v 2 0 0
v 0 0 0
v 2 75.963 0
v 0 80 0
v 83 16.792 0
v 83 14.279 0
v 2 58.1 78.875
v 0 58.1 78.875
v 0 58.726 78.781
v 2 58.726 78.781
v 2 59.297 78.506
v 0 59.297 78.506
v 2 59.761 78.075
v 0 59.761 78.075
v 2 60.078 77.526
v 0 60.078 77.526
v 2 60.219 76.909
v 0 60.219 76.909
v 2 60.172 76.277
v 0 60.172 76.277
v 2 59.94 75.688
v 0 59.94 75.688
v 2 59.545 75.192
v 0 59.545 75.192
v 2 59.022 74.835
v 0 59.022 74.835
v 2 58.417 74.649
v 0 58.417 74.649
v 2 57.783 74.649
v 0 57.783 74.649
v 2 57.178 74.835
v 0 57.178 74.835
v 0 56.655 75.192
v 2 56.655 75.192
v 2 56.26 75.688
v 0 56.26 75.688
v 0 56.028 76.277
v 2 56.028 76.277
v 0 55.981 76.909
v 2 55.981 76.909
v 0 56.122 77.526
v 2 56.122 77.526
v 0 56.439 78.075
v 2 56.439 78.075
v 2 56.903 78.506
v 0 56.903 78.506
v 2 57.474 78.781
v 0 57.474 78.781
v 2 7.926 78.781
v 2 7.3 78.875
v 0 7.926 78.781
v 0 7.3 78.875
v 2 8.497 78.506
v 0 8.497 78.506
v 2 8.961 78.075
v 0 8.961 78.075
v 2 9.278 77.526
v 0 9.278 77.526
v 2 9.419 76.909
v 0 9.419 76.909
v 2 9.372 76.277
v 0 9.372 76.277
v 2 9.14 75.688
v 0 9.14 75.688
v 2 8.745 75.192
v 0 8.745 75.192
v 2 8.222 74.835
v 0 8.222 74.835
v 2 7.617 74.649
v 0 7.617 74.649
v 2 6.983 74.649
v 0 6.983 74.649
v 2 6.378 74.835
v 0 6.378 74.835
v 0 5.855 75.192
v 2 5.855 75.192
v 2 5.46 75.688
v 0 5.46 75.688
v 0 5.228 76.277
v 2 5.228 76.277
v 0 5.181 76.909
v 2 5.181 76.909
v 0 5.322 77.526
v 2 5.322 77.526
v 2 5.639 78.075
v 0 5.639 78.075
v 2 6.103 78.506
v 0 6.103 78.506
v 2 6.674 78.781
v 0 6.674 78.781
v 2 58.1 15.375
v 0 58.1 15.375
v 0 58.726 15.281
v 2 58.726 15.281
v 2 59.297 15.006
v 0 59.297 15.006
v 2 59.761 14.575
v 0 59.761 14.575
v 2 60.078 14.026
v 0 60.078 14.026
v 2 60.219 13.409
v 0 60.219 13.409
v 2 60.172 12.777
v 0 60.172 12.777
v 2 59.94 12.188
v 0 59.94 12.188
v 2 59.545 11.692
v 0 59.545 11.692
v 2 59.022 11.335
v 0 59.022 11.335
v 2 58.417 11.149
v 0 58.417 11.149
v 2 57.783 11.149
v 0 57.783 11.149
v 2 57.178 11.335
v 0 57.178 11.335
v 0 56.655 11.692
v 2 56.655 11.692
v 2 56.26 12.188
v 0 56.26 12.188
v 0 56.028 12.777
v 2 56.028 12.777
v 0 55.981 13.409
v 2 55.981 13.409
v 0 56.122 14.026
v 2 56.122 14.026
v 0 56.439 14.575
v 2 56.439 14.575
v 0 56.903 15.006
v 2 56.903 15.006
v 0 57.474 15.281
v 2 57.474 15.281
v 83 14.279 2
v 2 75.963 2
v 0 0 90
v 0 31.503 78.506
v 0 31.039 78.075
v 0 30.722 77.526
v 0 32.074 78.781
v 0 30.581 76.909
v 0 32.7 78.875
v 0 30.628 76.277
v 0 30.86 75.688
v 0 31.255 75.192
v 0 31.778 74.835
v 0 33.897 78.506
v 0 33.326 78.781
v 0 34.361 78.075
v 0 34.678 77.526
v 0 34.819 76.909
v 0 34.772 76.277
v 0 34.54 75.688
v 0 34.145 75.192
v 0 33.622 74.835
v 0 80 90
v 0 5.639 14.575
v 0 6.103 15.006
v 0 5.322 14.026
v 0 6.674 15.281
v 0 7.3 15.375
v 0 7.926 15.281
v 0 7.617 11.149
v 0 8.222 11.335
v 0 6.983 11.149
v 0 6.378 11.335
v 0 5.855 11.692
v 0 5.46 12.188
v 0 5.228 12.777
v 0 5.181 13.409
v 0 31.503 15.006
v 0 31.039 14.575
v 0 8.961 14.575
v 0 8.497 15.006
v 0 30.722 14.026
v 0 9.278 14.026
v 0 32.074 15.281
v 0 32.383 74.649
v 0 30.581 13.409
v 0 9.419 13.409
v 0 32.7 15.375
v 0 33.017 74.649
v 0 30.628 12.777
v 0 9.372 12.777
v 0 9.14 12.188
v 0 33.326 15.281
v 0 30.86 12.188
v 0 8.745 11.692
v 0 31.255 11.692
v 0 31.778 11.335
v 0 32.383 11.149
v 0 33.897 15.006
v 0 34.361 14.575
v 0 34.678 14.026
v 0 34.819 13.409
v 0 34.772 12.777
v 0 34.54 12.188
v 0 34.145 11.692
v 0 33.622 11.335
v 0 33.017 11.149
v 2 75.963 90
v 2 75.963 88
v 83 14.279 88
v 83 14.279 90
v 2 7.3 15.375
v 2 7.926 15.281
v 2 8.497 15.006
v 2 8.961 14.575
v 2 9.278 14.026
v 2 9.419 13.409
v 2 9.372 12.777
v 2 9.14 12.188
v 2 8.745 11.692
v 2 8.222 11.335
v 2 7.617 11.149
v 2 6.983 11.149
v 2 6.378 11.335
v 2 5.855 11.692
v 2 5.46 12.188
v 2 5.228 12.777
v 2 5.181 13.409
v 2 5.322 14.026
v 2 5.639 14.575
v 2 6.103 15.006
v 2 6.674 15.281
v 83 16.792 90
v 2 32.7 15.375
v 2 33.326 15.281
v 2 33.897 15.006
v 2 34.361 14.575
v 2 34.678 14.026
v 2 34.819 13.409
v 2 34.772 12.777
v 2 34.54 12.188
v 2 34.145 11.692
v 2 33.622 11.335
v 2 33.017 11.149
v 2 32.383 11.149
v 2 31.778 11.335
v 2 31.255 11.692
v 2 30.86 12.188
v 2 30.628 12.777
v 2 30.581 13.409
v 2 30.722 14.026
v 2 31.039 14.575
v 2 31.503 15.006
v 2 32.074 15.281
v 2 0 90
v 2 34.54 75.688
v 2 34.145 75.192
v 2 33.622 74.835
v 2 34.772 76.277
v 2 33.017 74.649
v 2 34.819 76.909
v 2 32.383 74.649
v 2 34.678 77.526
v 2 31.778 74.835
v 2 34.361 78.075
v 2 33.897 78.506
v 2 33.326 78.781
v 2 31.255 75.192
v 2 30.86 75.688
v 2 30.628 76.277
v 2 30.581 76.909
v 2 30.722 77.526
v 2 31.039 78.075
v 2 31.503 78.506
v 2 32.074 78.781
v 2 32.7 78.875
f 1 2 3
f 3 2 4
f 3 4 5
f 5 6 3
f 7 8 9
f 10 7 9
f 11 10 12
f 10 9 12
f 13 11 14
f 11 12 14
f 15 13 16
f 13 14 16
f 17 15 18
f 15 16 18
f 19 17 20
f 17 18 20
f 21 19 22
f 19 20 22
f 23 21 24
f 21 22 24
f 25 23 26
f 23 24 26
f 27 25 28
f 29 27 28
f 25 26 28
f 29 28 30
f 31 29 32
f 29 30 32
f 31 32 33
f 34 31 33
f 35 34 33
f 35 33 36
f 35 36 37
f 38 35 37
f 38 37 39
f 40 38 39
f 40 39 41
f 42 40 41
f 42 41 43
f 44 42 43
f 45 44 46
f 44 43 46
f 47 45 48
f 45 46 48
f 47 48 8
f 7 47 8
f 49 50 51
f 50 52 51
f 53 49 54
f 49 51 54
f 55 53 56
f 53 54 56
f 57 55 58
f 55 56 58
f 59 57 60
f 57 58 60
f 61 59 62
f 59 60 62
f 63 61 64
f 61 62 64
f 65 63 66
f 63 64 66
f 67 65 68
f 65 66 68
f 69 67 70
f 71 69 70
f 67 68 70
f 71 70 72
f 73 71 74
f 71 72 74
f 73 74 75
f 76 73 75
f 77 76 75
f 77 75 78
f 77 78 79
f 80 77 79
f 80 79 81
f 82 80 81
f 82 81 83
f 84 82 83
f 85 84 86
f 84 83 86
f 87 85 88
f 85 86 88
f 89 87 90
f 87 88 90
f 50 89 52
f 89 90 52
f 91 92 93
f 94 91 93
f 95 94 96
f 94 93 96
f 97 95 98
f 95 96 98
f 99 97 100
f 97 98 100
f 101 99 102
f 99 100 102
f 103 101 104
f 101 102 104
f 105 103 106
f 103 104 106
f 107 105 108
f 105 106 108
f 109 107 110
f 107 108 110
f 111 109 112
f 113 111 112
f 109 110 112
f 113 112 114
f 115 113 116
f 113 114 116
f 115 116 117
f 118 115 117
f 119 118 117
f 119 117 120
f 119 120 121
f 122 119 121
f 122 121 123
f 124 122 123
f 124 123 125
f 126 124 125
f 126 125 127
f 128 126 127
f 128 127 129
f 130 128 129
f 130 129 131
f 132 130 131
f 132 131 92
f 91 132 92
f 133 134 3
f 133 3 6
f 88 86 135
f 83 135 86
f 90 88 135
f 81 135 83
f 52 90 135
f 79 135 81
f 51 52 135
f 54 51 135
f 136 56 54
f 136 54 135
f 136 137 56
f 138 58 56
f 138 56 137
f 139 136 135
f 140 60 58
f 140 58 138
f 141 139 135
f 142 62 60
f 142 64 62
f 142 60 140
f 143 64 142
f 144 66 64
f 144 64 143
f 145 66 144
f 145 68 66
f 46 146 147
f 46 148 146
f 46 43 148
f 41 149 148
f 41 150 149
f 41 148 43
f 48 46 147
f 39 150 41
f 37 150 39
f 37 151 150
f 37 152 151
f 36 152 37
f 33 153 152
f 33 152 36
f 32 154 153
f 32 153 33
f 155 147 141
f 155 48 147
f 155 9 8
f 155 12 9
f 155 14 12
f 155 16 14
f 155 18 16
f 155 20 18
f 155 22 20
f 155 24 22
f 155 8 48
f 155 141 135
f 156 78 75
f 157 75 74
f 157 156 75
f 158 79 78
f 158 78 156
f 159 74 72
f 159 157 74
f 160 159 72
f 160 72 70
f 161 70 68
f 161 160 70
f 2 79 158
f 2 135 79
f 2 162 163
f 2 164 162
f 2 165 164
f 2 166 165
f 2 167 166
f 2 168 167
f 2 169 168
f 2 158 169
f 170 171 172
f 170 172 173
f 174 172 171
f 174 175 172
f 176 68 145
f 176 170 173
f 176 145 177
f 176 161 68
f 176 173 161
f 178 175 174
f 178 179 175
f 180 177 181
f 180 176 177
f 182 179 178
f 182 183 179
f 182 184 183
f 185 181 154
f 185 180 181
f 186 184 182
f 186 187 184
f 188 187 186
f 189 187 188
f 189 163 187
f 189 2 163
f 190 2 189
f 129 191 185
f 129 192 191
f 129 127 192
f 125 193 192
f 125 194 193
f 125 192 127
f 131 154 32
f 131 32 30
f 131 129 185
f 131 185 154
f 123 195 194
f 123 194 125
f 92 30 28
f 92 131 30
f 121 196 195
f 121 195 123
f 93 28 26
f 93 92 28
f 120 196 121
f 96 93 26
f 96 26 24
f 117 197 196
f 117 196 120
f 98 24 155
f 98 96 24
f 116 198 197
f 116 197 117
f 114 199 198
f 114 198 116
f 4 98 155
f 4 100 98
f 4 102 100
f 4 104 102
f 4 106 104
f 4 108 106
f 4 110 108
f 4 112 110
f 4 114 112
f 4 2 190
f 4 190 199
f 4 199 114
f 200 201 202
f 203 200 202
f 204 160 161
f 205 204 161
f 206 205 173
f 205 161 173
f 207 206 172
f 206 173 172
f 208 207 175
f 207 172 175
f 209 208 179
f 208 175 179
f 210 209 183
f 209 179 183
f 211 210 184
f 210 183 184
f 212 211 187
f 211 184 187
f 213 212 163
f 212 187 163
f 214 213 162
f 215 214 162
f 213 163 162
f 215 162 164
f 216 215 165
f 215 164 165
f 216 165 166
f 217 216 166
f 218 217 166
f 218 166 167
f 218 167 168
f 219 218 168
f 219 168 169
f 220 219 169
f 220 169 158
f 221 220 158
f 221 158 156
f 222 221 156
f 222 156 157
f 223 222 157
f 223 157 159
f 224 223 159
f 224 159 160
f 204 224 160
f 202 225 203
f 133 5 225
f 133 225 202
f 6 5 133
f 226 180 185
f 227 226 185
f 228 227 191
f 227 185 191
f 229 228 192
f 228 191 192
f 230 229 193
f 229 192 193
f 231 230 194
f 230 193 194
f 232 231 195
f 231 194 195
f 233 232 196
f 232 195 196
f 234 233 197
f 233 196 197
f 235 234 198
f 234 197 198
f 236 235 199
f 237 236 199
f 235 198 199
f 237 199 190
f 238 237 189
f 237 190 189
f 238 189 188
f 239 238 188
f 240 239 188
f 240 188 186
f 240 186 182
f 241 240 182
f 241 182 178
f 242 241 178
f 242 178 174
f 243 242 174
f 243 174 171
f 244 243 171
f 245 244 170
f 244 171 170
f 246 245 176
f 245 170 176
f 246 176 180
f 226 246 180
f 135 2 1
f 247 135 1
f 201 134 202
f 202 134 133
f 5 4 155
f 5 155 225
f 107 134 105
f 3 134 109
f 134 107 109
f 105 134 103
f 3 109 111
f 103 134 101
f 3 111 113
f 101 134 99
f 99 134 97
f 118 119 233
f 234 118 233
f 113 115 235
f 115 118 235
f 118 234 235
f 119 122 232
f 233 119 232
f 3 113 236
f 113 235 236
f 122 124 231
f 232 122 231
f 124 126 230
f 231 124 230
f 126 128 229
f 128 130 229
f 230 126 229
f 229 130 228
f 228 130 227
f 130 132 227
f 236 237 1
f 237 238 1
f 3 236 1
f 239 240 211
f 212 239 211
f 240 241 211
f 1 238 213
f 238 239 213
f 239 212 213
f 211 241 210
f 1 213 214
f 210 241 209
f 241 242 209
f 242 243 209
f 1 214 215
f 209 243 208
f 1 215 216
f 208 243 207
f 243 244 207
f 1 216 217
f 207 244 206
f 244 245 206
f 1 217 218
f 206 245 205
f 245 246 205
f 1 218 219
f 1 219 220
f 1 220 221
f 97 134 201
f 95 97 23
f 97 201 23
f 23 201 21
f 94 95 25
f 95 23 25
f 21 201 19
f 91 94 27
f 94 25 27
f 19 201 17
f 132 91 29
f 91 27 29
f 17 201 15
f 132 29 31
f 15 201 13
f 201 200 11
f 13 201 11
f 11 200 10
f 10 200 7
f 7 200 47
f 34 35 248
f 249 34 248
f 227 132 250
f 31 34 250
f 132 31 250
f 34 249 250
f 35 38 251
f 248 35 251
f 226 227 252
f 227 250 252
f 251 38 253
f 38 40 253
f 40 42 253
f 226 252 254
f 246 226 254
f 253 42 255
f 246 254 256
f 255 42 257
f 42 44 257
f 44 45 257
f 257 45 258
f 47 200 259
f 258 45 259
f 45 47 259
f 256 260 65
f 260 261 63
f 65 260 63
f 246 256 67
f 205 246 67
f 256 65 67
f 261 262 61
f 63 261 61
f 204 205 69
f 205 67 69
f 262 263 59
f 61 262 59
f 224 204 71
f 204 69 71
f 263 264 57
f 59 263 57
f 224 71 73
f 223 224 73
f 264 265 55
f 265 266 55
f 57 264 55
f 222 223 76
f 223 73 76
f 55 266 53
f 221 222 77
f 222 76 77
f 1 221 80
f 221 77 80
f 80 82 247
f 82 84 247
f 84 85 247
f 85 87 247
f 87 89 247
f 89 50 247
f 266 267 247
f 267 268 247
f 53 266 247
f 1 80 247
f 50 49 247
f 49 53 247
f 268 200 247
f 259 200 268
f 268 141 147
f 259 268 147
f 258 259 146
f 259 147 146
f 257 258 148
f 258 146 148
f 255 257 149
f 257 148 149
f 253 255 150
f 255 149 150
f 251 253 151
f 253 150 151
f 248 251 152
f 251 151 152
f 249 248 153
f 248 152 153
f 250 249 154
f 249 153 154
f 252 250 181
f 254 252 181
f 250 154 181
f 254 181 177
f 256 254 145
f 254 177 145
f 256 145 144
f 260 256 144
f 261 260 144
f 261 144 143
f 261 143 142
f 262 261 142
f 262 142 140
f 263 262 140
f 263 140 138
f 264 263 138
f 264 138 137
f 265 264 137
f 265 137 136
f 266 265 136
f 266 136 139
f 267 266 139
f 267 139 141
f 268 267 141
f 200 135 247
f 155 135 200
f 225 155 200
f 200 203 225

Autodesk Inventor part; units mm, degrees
ref_plane "YZ Plane" through (0, 0, 0) normal (1, 0, 0) x (0, 1, 0)
ref_plane "XZ Plane" through (0, 0, 0) normal (0, 1, 0) x (-1, 0, 0)
ref_plane "XY Plane" through (0, 0, 0) normal (0, 0, 1) x (1, 0, 0)
sketch "Sketch1" plane through (0, 0, 0) normal (0, 0, 1) x (1, 0, 0)
  line L0 (0, 0) -> (0, 80)
  line L1 (0, 0) -> (83, 0)
  line L2 (83, 16.7925) -> (83, 0)
  line L3 (0, 80) -> (83, 16.7925)
  dimension "d0" = 80
  dimension "d1" = 83
extrude "Extrusion1" add sketch "Sketch1" along normal blind 90
shell "Shell1" thickness 2 removed faces 2 at (27.6667, 0, 60) at (83, 5.5975, 30)
sketch "Sketch2" plane through (0, 0, 0) normal (-1, 0, 0) x (0, 0, 1)
  circle A0 centre (13.25, 32.7) radius 2.125
  circle A1 centre (13.25, 7.3) radius 2.125
  circle A2 centre (76.75, 32.7) radius 2.125
  line L0 (90, 80) -> (90, 0) projected
  line L1 (0, 80) -> (0, 0) projected
  circle A3 centre (76.75, 7.3) radius 2.125
  line L2 (0, 0) -> (90, 0) projected
  line L3 (0, 80) -> (90, 80) projected
  circle A4 centre (13.25, 58.1) radius 2.125
  circle A5 centre (76.75, 58.1) radius 2.125
  dimension "d5" = 4.25
  dimension "d6" = 4.25
  dimension "d7" = 4.25
  dimension "d8" = 63.5
  dimension "d10" = 13.25
  dimension "d11" = 25.4
  dimension "d12" = 4.25
  dimension "d13" = 63.5
  dimension "d14" = 7.3
  dimension "d15" = 7.3
  dimension "d28" = 13.25
  dimension "d36" = 4.25
  dimension "d37" = 4.25
  dimension "d38" = 25.4
  dimension "d39" = 25.4
  dimension "d40" = 21.9
  dimension "d41" = 21.9
  dimension "d42" = 13.25
extrude "Extrusion2" cut sketch "Sketch2" against normal blind 2 contours A0 | A1 | A2 | A3 | A4 | A5
sketch "Sketch3" plane through (0, 0, 90) normal (0, 0, 1) x (1, 0, 0)
  circle A0 centre (78.5, 8.5093) radius 2.5
  line L0 (83, 0) -> (83, 16.7925) projected
  line L1 (83, 16.7925) -> (0, 80) projected
  point P0 (0, 0)
  point P1 (83, 8.3963)
  dimension "d19" = 5
  dimension "d20" = 4.5
  dimension "d21" = 9.3163
extrude "Extrusion3" cut sketch "Sketch3" against normal blind 2
sketch "Sketch4" plane through (0, 0, 0) normal (0, 0, -1) x (-1, 0, 0)
  circle A0 centre (-78.5, 8.5093) radius 2.5 projected
  circle A1 centre (-78.5, 8.5093) radius 2.5
  point P0 (0, 0)
  dimension "d24" = 5
extrude "Extrusion4" cut sketch "Sketch4" against normal blind 2
sketch "Sketch7" plane through (2, 0, 2) normal (0, 0, 1) x (1, 0, 0)
  line L0 (81, 0) -> (0, 0) projected
  line L1 (0, 75.963) -> (0, 0) projected
  line L2 (0, 0) -> (0, 75.963)
  line L3 (81, 14.2786) -> (81, 0) projected
  line L4 (0, 75.963) -> (81, 14.2786)
  line L5 (81, 14.2786) -> (81, 0)
  line L6 (81, 0) -> (0, 0)
  point P0 (-2, 0)
extrude "Extrusion7" cut sketch "Sketch7" against normal blind 2
sketch "Sketch8" plane through (83, 0, 88) normal (0, 0, -1) x (-1, 0, 0)
  line L0 (0, 0) -> (0, 14.2786) projected
  line L1 (0, 0) -> (0, 16.7925) projected
  line L2 (0, 14.2786) -> (0, 0)
  line L3 (81, 75.963) -> (81, 0) projected
  line L4 (0, 0) -> (81, 0)
  line L5 (81, 0) -> (81, 75.963)
  line L6 (81, 75.963) -> (0, 14.2786)
  line L7 (0, 16.7925) -> (83, 80) projected
  point P0 (83, 0)
extrude "Extrusion8" cut sketch "Sketch8" against normal blind 2
properties part number "P1D1_2Ramp"
